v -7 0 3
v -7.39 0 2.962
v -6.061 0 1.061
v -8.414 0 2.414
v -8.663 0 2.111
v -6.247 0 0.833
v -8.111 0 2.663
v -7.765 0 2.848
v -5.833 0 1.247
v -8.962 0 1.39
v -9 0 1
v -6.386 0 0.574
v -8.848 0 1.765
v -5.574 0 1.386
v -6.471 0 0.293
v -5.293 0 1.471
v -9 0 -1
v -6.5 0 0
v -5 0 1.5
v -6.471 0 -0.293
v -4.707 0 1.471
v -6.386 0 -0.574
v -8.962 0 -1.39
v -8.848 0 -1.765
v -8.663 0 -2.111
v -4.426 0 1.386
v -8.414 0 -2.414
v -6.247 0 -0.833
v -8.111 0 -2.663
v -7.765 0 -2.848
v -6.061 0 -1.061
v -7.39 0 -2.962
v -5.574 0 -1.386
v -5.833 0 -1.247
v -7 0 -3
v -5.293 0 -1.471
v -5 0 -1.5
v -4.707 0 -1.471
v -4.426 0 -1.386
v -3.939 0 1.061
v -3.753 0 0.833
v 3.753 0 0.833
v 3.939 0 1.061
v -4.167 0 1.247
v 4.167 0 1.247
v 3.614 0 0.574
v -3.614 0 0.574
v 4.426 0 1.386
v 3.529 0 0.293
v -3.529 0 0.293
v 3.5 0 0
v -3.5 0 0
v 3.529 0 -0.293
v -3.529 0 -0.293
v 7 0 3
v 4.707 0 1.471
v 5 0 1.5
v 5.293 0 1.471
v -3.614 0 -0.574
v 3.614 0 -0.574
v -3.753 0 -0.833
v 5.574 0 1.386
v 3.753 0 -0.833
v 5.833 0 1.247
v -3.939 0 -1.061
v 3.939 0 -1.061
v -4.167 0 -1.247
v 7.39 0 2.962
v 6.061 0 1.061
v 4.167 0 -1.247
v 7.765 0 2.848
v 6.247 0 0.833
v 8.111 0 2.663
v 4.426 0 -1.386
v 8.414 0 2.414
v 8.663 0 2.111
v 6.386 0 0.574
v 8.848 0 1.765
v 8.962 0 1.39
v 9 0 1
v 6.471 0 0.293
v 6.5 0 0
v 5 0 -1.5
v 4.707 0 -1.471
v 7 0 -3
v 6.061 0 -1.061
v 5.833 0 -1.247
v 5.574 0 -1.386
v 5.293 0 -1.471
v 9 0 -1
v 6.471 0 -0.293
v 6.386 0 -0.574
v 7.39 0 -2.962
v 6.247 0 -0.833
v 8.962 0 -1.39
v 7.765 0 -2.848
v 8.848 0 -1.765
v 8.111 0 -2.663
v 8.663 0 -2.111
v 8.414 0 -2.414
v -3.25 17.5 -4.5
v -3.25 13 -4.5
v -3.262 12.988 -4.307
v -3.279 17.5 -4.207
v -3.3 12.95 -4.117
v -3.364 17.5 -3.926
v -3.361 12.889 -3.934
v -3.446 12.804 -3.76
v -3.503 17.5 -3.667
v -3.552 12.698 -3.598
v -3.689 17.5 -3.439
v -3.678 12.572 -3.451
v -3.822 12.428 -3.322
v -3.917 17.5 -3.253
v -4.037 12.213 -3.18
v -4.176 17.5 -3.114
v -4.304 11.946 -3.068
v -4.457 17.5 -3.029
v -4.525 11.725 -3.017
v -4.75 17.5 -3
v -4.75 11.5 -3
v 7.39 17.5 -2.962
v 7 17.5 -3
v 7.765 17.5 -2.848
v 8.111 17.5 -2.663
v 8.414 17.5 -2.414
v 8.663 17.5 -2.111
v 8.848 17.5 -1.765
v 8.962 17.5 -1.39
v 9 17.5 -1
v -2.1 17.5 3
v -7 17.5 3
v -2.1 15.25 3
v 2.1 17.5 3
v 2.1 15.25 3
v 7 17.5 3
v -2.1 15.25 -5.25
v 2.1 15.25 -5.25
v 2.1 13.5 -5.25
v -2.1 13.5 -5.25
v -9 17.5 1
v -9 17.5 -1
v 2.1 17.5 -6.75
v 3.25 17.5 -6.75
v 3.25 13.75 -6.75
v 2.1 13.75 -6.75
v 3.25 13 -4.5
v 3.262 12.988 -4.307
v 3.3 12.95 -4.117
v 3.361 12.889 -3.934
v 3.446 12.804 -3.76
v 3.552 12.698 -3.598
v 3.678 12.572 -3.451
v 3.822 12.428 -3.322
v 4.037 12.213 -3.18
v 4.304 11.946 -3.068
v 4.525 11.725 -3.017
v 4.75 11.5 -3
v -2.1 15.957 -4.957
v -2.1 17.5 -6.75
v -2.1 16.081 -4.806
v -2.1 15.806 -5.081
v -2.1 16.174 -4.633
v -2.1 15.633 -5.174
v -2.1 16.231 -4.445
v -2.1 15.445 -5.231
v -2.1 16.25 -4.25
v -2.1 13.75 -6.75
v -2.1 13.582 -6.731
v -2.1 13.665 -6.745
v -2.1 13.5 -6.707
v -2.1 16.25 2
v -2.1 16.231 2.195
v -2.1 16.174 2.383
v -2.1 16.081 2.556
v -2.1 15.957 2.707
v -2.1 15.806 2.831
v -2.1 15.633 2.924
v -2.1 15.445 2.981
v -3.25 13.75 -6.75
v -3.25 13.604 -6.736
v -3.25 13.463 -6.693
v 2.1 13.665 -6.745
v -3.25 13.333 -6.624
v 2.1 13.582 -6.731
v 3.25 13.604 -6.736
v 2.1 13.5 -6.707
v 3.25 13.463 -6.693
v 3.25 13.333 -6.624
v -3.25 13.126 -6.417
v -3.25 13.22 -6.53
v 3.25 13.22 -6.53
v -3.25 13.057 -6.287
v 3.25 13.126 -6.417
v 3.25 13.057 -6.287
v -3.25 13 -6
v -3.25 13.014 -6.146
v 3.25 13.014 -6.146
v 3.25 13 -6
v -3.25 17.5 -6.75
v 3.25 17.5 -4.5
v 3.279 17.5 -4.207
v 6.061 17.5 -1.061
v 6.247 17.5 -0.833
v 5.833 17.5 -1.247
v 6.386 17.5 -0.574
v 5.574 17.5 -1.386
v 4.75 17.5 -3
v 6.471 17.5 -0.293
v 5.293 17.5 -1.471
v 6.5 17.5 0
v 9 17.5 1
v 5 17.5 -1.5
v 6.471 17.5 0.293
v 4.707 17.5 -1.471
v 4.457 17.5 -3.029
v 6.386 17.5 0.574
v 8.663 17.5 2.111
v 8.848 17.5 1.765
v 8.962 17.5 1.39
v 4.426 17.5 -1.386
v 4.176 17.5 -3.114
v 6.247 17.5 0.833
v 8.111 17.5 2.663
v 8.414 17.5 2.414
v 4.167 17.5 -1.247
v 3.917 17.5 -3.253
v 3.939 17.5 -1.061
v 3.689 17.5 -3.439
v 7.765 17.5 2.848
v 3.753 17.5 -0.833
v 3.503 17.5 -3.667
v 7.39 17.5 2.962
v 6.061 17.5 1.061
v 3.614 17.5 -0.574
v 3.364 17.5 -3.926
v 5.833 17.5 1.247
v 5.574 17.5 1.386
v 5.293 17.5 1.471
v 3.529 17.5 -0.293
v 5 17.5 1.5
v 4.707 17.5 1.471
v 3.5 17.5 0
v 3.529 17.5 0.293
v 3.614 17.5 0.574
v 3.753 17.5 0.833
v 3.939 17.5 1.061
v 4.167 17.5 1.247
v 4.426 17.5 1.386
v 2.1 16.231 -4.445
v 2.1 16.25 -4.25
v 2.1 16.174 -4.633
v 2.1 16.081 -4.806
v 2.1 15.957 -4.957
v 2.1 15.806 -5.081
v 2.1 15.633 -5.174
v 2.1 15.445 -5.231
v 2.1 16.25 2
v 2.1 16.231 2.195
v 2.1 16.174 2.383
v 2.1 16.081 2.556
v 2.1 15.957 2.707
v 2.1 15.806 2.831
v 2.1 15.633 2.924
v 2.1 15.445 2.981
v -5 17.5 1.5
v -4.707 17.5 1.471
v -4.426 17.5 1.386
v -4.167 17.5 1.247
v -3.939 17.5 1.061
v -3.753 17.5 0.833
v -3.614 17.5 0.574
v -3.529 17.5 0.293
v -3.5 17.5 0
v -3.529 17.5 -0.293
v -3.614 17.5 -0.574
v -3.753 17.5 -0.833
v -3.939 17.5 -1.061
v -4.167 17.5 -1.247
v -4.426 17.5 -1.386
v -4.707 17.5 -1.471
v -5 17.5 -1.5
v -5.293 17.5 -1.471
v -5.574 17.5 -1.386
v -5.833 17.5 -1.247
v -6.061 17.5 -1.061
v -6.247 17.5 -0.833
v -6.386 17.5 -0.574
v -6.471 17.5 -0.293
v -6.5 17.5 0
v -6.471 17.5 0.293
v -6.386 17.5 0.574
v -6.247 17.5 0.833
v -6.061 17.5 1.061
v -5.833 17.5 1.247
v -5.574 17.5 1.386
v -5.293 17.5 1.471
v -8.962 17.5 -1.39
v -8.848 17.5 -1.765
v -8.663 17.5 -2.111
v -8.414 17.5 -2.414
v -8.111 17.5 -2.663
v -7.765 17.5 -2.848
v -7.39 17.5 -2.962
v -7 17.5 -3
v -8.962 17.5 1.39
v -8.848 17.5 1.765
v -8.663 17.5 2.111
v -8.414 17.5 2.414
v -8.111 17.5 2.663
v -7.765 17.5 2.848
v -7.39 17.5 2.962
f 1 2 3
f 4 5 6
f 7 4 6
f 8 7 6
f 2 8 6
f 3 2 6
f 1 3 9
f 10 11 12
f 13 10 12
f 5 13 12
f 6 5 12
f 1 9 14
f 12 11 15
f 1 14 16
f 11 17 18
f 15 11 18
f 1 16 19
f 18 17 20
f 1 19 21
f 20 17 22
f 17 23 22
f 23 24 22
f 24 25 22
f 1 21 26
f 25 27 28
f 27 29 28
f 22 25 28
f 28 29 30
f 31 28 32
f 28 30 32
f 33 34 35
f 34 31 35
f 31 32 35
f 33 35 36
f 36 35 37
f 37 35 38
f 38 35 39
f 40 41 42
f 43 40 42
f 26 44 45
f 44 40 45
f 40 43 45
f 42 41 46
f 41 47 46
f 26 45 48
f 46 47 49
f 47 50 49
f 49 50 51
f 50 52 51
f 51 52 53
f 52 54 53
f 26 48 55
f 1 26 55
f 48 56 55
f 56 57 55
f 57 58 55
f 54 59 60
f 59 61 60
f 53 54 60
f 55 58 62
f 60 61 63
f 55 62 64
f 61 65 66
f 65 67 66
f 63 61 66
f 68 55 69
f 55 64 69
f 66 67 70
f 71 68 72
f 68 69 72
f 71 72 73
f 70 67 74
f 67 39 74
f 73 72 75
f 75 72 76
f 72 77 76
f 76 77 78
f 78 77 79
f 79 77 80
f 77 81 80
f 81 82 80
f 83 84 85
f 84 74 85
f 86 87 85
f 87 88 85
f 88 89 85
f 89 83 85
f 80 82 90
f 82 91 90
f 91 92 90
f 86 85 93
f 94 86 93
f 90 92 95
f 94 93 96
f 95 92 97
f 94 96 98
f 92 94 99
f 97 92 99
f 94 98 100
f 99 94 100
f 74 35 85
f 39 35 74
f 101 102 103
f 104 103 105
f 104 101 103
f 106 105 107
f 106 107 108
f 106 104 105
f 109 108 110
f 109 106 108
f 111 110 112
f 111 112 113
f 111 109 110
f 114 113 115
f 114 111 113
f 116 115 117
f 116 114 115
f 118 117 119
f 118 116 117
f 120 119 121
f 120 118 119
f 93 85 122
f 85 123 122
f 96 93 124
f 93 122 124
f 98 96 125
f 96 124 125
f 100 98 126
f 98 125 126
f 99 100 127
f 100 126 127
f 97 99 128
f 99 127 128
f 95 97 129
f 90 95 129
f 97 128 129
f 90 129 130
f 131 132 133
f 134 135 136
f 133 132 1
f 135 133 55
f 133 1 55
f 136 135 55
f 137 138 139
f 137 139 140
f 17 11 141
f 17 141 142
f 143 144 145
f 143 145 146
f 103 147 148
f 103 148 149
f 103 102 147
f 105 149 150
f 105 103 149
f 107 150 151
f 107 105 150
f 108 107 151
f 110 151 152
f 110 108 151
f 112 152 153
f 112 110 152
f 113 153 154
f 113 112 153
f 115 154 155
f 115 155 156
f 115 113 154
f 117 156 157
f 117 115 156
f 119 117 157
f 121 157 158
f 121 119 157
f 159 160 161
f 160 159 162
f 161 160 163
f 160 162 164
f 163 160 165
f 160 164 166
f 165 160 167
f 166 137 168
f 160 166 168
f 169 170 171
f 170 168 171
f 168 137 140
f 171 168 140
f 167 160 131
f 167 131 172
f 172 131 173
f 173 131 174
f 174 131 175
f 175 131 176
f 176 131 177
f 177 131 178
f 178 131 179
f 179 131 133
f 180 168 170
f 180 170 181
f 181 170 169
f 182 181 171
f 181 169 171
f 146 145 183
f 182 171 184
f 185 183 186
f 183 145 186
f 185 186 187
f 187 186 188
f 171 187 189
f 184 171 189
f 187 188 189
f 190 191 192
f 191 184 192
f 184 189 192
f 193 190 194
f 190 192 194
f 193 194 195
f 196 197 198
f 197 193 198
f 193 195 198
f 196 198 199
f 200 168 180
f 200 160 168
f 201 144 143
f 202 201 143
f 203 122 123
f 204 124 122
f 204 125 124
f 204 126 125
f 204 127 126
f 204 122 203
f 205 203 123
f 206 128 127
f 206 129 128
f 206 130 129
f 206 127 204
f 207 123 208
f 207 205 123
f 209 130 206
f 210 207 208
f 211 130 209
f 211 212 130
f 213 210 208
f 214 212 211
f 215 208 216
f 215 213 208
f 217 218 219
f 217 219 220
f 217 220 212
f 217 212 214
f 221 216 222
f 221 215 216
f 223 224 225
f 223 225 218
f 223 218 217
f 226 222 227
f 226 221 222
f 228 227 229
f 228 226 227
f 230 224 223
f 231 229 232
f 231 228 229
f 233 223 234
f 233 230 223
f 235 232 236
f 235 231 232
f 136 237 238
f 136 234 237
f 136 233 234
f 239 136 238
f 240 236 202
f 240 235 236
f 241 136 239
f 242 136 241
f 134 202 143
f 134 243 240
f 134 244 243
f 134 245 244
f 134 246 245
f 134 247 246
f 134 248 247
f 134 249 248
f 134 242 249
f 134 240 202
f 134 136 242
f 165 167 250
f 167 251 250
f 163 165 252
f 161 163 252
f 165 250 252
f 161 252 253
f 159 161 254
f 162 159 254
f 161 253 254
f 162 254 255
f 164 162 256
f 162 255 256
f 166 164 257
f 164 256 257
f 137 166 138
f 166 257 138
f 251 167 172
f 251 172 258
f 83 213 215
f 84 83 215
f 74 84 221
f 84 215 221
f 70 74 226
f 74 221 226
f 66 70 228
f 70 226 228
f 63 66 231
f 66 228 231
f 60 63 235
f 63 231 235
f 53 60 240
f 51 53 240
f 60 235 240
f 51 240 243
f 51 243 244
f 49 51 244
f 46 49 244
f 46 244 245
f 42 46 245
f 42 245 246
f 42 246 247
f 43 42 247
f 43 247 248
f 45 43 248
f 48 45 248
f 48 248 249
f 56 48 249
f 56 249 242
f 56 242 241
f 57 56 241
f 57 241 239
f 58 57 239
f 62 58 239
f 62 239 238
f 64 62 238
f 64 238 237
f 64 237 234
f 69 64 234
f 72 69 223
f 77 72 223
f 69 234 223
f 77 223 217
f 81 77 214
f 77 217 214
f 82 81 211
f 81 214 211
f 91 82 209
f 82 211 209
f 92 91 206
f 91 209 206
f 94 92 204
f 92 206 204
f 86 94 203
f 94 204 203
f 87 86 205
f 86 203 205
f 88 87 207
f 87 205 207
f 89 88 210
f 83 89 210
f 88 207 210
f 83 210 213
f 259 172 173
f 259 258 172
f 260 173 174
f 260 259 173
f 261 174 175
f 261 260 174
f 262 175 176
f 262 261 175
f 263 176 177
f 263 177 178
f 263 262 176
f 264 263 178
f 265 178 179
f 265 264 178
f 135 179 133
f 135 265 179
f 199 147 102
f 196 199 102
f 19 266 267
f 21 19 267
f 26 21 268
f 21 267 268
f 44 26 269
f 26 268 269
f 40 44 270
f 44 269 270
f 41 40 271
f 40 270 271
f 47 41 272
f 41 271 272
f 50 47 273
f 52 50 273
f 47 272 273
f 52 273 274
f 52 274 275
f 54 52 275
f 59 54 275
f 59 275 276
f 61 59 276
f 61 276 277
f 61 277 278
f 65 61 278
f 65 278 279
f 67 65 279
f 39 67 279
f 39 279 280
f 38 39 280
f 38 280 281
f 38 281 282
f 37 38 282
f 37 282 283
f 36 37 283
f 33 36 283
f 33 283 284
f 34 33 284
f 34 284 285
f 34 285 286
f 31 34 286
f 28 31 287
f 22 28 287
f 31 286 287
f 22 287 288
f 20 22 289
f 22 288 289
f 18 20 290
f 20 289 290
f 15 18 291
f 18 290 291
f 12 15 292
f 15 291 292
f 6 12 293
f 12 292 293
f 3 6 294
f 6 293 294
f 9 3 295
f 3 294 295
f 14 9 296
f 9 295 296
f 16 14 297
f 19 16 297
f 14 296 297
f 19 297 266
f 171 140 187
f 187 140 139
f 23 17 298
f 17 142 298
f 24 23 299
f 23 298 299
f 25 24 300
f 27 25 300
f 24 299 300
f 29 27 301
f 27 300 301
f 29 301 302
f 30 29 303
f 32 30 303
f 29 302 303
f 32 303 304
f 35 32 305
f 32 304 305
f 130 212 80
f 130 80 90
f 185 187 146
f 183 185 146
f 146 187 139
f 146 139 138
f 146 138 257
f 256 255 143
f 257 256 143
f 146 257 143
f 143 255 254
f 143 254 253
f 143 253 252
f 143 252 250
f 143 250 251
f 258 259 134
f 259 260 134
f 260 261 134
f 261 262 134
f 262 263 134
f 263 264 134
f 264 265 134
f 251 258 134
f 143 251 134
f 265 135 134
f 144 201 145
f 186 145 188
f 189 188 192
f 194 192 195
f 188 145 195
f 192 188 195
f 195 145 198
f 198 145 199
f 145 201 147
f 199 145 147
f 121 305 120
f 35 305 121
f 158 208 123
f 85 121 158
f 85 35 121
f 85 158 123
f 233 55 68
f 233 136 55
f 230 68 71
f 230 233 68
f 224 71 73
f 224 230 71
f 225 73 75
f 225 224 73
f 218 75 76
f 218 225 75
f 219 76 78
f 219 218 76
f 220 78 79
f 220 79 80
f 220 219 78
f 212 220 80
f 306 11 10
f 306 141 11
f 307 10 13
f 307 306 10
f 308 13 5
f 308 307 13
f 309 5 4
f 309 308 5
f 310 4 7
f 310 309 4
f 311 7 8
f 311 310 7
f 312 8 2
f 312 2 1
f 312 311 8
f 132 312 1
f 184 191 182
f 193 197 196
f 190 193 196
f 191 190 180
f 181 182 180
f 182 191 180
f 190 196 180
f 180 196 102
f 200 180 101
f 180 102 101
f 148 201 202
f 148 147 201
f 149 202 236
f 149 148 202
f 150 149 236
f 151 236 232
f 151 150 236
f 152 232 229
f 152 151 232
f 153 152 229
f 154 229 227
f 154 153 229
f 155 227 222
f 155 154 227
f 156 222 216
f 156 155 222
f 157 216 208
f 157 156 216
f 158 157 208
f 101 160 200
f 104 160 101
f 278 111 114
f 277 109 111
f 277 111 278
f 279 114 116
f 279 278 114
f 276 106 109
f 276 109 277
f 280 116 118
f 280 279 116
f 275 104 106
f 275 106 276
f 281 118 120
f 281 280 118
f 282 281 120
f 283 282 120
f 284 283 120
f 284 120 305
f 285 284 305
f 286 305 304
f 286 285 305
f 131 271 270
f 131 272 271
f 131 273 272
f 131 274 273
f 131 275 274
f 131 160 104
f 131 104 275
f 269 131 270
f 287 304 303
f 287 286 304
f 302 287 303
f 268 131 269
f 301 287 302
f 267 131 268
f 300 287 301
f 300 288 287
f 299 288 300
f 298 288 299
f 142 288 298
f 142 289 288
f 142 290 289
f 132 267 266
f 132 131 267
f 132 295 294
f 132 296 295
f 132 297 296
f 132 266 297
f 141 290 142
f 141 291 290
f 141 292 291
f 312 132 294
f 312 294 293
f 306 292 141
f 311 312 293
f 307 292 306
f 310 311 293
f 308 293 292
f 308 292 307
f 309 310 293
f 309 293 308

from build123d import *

# Parameters (mm, degrees)
SKETCH1_W           = 18
SKETCH1_H           = 6
BOSS_EXTRUDE1_DEPTH = 17.5
SKETCH2_R           = 1.5
CUT_EXTRUDE1_DEPTH  = 20.906029237
FILLET1_R           = 2
BOSS_EXTRUDE2_DEPTH = 3.75
SKETCH4_W           = 4.2
SKETCH4_H           = 4
BOSS_EXTRUDE3_DEPTH = 2.25
SKETCH5_W           = 4.2
SKETCH5_H           = 8.25
CUT_EXTRUDE2_DEPTH  = 1.25
FILLET5_R           = 1
FILLET6_R           = 1.5
FILLET7_R           = 0.75


with BuildPart() as part:
    # Sketch1 → Boss-Extrude1 (new body)
    with BuildSketch(Plane(origin=(0, 0, 0), x_dir=(1, 0, 0), z_dir=(0, 1, 0))):
        Rectangle(SKETCH1_W, SKETCH1_H)
    extrude(amount=BOSS_EXTRUDE1_DEPTH)

    # Sketch2 → Cut-Extrude1 (cut, through all)
    with BuildSketch(Plane(origin=(0, 17.5, 0), x_dir=(1, 0, 0), z_dir=(0, 1, 0))):
        with Locations(Location((-5, 0, 0), (0, 0, 270))):
            Circle(SKETCH2_R)
        with Locations(Location((5, 0, 0), (0, 0, 90))):
            Circle(SKETCH2_R)
    extrude(amount=-CUT_EXTRUDE1_DEPTH, mode=Mode.SUBTRACT)

    # Fillet1
    fillet1_edges = [part.edges().sort_by_distance(p)[0] for p in [
        (9, 8.75, 3),
        (-9, 8.75, 3),
        (-9, 8.75, -3),
        (9, 8.75, -3),
    ]]
    fillet(fillet1_edges, radius=FILLET1_R)

    # Sketch3 → Boss-Extrude2 (add)
    with BuildSketch(Plane(origin=(0, 0, -3), x_dir=(-1, 0, 0), z_dir=(0, 0, -1))):
        Polygon((-3.25, 17.5), (-3.25, 13), (3.25, 13), (3.25, 17.5), (2.1, 17.5), (2.1, 13.5), (-2.1, 13.5), (-2.1, 17.5), align=None)
    extrude(amount=BOSS_EXTRUDE2_DEPTH)

    # Sketch4 → Boss-Extrude3 (add)
    with BuildSketch(Plane(origin=(0, 0, -3), x_dir=(-1, 0, 0), z_dir=(0, 0, -1))):
        with Locations((0, 15.5)):
            Rectangle(SKETCH4_W, SKETCH4_H)
    extrude(amount=BOSS_EXTRUDE3_DEPTH)

    # Sketch5 → Cut-Extrude2 (cut)
    with BuildSketch(Plane(origin=(0, 17.5, 0), x_dir=(1, 0, 0), z_dir=(0, 1, 0))):
        with Locations((0, 1.125)):
            Rectangle(SKETCH5_W, SKETCH5_H)
    extrude(amount=-CUT_EXTRUDE2_DEPTH, mode=Mode.SUBTRACT)

    # Fillet5
    fillet5_edges = [part.edges().sort_by_distance(p)[0] for p in [
        (0, 16.25, 3),
        (0, 16.25, -5.25),
    ]]
    fillet(fillet5_edges, radius=FILLET5_R)

    # Fillet6
    fillet6_edges = [part.edges().sort_by_distance(p)[0] for p in [
        (0, 13, -3),
        (-3.25, 15.25, -3),
        (3.25, 15.25, -3),
    ]]
    fillet(fillet6_edges, radius=FILLET6_R)

    # Fillet7
    # the kernel refuses this fillet: 0.75 mm, written as the material it takes off along each edge
    with BuildSketch(Plane(origin=(5.125, 13, -6.75), x_dir=(0, 1, 0), z_dir=(-1, 0, 0))) as fillet7_piece_1:
        with BuildLine():
            CenterArc((FILLET7_R, -FILLET7_R), FILLET7_R, 90, 90)
            Line((0, -FILLET7_R), (0, 0))
            Line((0, 0), (FILLET7_R, 0))
        make_face()
    extrude(amount=10.25, mode=Mode.SUBTRACT)


solid = part.part
